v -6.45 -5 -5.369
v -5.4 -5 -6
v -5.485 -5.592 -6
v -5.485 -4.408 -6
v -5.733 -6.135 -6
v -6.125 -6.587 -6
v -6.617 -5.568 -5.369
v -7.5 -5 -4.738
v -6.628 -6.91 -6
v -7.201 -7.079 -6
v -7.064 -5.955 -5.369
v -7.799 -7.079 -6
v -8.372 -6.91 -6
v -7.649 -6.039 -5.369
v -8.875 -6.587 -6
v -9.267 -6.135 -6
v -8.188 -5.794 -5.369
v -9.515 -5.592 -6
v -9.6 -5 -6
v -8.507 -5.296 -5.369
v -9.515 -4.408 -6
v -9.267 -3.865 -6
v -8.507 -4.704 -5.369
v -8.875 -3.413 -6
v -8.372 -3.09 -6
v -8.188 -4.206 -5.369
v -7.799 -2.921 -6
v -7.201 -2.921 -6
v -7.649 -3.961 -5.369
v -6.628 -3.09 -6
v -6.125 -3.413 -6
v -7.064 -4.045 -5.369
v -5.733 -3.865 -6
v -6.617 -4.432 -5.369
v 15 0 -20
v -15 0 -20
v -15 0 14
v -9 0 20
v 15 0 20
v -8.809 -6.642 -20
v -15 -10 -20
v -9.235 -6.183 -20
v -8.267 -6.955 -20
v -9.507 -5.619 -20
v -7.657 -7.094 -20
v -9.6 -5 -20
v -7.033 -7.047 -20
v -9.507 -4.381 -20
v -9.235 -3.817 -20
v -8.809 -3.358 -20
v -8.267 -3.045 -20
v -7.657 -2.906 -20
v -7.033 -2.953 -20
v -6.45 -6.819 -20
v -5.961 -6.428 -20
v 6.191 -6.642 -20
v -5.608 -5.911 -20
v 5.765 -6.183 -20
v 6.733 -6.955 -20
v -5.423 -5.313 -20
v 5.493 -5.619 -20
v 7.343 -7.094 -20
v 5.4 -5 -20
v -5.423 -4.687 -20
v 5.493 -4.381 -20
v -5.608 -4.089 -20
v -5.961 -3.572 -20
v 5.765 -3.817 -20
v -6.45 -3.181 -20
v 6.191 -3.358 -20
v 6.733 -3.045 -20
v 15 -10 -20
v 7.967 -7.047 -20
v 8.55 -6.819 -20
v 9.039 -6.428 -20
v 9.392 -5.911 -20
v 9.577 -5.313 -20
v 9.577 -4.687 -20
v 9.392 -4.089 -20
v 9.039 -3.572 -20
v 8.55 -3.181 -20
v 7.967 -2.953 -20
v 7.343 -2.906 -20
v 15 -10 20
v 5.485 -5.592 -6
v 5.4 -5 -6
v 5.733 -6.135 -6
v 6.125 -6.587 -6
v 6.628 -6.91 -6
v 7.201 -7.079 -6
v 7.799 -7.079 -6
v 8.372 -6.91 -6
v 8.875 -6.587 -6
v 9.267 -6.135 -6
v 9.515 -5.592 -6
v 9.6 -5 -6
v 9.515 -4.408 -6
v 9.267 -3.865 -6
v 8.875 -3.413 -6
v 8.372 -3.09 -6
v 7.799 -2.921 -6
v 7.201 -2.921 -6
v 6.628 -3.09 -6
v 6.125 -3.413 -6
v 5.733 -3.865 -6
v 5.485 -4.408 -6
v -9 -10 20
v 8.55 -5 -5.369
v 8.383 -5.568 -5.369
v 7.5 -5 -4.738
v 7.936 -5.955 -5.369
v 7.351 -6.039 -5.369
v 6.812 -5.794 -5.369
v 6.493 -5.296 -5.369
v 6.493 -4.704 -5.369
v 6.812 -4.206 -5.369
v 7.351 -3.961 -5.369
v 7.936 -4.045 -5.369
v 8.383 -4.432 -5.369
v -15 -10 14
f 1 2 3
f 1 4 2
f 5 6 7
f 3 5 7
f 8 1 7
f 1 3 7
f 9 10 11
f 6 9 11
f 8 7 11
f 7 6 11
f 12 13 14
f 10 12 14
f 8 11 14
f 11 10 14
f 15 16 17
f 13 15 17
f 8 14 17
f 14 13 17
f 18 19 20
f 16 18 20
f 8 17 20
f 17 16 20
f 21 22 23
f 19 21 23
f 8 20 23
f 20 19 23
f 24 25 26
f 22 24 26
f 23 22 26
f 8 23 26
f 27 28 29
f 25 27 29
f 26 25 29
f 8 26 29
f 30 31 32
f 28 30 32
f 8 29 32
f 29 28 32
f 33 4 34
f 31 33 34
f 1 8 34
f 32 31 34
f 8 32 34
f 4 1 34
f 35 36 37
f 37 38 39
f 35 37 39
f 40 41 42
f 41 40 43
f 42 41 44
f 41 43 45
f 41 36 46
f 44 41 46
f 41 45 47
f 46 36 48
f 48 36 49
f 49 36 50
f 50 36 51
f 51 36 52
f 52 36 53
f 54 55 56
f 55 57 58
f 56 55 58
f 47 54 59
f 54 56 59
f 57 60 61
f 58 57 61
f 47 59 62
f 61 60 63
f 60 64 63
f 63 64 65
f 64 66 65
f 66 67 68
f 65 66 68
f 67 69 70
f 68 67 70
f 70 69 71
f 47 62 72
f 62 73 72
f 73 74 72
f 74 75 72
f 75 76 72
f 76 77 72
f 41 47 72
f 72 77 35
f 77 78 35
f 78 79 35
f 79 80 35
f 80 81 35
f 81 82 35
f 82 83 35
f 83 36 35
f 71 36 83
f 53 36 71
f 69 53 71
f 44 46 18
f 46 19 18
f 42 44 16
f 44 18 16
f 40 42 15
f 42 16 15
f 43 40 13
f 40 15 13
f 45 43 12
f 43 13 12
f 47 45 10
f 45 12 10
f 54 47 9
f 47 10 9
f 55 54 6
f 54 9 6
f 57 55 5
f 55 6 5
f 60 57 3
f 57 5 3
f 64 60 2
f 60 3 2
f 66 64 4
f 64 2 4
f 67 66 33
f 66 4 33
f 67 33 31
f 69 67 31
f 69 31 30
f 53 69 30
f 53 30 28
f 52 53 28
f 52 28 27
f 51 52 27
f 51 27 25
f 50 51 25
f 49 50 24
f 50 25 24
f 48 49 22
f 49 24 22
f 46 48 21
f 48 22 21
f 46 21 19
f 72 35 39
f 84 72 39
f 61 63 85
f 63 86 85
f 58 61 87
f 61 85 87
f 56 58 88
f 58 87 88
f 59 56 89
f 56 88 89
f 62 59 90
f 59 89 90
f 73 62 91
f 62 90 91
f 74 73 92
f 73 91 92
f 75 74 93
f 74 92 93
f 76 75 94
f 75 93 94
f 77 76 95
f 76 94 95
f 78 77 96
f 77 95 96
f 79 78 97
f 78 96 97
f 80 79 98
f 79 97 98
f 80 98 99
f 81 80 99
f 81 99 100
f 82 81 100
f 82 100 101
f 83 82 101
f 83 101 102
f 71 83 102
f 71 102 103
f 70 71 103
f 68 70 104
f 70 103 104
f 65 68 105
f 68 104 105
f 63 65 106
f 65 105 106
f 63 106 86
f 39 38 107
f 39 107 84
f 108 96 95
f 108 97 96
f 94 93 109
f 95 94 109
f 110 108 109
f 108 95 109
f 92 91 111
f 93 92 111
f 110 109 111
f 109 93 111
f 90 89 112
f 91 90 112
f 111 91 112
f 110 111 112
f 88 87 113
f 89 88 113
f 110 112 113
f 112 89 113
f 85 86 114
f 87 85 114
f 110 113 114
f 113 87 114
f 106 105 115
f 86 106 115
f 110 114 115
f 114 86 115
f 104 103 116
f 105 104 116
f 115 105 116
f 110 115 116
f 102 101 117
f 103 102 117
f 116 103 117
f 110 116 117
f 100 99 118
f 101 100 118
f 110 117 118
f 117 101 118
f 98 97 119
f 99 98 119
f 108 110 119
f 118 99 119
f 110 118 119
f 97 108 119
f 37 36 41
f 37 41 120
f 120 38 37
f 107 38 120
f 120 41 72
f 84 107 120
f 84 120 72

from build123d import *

# Parameters (mm, degrees)
F0_W     = 30
F0_H     = 40
F1_DEPTH = 10
F2_SIZE  = 6
F4_D     = 4.2
F4_DEPTH = 14
F4_TIP   = 1.2618073


with BuildPart() as f1:
    # F0 (on Front) → F1 (new body)
    with BuildSketch(Plane.XZ):
        Rectangle(F0_W, F0_H)
    extrude(amount=F1_DEPTH)

    # F2
    f2_edges = [f1.edges().sort_by_distance(p)[0] for p in [
        (-15, -5, 20),
    ]]
    chamfer(f2_edges, length=F2_SIZE)

    # F4
    with Locations(Plane(origin=(0, 0, -20), x_dir=(1, 0, 0), z_dir=(0, 0, -1))):
        with Locations((7.5, 5), (-7.5, 5)):
            Hole(F4_D / 2, depth=F4_DEPTH)
            with Locations((0, 0, -(F4_DEPTH + F4_TIP / 2))):  # 118° drill point
                Cone(0, F4_D / 2, F4_TIP, mode=Mode.SUBTRACT)


solid = f1.part
